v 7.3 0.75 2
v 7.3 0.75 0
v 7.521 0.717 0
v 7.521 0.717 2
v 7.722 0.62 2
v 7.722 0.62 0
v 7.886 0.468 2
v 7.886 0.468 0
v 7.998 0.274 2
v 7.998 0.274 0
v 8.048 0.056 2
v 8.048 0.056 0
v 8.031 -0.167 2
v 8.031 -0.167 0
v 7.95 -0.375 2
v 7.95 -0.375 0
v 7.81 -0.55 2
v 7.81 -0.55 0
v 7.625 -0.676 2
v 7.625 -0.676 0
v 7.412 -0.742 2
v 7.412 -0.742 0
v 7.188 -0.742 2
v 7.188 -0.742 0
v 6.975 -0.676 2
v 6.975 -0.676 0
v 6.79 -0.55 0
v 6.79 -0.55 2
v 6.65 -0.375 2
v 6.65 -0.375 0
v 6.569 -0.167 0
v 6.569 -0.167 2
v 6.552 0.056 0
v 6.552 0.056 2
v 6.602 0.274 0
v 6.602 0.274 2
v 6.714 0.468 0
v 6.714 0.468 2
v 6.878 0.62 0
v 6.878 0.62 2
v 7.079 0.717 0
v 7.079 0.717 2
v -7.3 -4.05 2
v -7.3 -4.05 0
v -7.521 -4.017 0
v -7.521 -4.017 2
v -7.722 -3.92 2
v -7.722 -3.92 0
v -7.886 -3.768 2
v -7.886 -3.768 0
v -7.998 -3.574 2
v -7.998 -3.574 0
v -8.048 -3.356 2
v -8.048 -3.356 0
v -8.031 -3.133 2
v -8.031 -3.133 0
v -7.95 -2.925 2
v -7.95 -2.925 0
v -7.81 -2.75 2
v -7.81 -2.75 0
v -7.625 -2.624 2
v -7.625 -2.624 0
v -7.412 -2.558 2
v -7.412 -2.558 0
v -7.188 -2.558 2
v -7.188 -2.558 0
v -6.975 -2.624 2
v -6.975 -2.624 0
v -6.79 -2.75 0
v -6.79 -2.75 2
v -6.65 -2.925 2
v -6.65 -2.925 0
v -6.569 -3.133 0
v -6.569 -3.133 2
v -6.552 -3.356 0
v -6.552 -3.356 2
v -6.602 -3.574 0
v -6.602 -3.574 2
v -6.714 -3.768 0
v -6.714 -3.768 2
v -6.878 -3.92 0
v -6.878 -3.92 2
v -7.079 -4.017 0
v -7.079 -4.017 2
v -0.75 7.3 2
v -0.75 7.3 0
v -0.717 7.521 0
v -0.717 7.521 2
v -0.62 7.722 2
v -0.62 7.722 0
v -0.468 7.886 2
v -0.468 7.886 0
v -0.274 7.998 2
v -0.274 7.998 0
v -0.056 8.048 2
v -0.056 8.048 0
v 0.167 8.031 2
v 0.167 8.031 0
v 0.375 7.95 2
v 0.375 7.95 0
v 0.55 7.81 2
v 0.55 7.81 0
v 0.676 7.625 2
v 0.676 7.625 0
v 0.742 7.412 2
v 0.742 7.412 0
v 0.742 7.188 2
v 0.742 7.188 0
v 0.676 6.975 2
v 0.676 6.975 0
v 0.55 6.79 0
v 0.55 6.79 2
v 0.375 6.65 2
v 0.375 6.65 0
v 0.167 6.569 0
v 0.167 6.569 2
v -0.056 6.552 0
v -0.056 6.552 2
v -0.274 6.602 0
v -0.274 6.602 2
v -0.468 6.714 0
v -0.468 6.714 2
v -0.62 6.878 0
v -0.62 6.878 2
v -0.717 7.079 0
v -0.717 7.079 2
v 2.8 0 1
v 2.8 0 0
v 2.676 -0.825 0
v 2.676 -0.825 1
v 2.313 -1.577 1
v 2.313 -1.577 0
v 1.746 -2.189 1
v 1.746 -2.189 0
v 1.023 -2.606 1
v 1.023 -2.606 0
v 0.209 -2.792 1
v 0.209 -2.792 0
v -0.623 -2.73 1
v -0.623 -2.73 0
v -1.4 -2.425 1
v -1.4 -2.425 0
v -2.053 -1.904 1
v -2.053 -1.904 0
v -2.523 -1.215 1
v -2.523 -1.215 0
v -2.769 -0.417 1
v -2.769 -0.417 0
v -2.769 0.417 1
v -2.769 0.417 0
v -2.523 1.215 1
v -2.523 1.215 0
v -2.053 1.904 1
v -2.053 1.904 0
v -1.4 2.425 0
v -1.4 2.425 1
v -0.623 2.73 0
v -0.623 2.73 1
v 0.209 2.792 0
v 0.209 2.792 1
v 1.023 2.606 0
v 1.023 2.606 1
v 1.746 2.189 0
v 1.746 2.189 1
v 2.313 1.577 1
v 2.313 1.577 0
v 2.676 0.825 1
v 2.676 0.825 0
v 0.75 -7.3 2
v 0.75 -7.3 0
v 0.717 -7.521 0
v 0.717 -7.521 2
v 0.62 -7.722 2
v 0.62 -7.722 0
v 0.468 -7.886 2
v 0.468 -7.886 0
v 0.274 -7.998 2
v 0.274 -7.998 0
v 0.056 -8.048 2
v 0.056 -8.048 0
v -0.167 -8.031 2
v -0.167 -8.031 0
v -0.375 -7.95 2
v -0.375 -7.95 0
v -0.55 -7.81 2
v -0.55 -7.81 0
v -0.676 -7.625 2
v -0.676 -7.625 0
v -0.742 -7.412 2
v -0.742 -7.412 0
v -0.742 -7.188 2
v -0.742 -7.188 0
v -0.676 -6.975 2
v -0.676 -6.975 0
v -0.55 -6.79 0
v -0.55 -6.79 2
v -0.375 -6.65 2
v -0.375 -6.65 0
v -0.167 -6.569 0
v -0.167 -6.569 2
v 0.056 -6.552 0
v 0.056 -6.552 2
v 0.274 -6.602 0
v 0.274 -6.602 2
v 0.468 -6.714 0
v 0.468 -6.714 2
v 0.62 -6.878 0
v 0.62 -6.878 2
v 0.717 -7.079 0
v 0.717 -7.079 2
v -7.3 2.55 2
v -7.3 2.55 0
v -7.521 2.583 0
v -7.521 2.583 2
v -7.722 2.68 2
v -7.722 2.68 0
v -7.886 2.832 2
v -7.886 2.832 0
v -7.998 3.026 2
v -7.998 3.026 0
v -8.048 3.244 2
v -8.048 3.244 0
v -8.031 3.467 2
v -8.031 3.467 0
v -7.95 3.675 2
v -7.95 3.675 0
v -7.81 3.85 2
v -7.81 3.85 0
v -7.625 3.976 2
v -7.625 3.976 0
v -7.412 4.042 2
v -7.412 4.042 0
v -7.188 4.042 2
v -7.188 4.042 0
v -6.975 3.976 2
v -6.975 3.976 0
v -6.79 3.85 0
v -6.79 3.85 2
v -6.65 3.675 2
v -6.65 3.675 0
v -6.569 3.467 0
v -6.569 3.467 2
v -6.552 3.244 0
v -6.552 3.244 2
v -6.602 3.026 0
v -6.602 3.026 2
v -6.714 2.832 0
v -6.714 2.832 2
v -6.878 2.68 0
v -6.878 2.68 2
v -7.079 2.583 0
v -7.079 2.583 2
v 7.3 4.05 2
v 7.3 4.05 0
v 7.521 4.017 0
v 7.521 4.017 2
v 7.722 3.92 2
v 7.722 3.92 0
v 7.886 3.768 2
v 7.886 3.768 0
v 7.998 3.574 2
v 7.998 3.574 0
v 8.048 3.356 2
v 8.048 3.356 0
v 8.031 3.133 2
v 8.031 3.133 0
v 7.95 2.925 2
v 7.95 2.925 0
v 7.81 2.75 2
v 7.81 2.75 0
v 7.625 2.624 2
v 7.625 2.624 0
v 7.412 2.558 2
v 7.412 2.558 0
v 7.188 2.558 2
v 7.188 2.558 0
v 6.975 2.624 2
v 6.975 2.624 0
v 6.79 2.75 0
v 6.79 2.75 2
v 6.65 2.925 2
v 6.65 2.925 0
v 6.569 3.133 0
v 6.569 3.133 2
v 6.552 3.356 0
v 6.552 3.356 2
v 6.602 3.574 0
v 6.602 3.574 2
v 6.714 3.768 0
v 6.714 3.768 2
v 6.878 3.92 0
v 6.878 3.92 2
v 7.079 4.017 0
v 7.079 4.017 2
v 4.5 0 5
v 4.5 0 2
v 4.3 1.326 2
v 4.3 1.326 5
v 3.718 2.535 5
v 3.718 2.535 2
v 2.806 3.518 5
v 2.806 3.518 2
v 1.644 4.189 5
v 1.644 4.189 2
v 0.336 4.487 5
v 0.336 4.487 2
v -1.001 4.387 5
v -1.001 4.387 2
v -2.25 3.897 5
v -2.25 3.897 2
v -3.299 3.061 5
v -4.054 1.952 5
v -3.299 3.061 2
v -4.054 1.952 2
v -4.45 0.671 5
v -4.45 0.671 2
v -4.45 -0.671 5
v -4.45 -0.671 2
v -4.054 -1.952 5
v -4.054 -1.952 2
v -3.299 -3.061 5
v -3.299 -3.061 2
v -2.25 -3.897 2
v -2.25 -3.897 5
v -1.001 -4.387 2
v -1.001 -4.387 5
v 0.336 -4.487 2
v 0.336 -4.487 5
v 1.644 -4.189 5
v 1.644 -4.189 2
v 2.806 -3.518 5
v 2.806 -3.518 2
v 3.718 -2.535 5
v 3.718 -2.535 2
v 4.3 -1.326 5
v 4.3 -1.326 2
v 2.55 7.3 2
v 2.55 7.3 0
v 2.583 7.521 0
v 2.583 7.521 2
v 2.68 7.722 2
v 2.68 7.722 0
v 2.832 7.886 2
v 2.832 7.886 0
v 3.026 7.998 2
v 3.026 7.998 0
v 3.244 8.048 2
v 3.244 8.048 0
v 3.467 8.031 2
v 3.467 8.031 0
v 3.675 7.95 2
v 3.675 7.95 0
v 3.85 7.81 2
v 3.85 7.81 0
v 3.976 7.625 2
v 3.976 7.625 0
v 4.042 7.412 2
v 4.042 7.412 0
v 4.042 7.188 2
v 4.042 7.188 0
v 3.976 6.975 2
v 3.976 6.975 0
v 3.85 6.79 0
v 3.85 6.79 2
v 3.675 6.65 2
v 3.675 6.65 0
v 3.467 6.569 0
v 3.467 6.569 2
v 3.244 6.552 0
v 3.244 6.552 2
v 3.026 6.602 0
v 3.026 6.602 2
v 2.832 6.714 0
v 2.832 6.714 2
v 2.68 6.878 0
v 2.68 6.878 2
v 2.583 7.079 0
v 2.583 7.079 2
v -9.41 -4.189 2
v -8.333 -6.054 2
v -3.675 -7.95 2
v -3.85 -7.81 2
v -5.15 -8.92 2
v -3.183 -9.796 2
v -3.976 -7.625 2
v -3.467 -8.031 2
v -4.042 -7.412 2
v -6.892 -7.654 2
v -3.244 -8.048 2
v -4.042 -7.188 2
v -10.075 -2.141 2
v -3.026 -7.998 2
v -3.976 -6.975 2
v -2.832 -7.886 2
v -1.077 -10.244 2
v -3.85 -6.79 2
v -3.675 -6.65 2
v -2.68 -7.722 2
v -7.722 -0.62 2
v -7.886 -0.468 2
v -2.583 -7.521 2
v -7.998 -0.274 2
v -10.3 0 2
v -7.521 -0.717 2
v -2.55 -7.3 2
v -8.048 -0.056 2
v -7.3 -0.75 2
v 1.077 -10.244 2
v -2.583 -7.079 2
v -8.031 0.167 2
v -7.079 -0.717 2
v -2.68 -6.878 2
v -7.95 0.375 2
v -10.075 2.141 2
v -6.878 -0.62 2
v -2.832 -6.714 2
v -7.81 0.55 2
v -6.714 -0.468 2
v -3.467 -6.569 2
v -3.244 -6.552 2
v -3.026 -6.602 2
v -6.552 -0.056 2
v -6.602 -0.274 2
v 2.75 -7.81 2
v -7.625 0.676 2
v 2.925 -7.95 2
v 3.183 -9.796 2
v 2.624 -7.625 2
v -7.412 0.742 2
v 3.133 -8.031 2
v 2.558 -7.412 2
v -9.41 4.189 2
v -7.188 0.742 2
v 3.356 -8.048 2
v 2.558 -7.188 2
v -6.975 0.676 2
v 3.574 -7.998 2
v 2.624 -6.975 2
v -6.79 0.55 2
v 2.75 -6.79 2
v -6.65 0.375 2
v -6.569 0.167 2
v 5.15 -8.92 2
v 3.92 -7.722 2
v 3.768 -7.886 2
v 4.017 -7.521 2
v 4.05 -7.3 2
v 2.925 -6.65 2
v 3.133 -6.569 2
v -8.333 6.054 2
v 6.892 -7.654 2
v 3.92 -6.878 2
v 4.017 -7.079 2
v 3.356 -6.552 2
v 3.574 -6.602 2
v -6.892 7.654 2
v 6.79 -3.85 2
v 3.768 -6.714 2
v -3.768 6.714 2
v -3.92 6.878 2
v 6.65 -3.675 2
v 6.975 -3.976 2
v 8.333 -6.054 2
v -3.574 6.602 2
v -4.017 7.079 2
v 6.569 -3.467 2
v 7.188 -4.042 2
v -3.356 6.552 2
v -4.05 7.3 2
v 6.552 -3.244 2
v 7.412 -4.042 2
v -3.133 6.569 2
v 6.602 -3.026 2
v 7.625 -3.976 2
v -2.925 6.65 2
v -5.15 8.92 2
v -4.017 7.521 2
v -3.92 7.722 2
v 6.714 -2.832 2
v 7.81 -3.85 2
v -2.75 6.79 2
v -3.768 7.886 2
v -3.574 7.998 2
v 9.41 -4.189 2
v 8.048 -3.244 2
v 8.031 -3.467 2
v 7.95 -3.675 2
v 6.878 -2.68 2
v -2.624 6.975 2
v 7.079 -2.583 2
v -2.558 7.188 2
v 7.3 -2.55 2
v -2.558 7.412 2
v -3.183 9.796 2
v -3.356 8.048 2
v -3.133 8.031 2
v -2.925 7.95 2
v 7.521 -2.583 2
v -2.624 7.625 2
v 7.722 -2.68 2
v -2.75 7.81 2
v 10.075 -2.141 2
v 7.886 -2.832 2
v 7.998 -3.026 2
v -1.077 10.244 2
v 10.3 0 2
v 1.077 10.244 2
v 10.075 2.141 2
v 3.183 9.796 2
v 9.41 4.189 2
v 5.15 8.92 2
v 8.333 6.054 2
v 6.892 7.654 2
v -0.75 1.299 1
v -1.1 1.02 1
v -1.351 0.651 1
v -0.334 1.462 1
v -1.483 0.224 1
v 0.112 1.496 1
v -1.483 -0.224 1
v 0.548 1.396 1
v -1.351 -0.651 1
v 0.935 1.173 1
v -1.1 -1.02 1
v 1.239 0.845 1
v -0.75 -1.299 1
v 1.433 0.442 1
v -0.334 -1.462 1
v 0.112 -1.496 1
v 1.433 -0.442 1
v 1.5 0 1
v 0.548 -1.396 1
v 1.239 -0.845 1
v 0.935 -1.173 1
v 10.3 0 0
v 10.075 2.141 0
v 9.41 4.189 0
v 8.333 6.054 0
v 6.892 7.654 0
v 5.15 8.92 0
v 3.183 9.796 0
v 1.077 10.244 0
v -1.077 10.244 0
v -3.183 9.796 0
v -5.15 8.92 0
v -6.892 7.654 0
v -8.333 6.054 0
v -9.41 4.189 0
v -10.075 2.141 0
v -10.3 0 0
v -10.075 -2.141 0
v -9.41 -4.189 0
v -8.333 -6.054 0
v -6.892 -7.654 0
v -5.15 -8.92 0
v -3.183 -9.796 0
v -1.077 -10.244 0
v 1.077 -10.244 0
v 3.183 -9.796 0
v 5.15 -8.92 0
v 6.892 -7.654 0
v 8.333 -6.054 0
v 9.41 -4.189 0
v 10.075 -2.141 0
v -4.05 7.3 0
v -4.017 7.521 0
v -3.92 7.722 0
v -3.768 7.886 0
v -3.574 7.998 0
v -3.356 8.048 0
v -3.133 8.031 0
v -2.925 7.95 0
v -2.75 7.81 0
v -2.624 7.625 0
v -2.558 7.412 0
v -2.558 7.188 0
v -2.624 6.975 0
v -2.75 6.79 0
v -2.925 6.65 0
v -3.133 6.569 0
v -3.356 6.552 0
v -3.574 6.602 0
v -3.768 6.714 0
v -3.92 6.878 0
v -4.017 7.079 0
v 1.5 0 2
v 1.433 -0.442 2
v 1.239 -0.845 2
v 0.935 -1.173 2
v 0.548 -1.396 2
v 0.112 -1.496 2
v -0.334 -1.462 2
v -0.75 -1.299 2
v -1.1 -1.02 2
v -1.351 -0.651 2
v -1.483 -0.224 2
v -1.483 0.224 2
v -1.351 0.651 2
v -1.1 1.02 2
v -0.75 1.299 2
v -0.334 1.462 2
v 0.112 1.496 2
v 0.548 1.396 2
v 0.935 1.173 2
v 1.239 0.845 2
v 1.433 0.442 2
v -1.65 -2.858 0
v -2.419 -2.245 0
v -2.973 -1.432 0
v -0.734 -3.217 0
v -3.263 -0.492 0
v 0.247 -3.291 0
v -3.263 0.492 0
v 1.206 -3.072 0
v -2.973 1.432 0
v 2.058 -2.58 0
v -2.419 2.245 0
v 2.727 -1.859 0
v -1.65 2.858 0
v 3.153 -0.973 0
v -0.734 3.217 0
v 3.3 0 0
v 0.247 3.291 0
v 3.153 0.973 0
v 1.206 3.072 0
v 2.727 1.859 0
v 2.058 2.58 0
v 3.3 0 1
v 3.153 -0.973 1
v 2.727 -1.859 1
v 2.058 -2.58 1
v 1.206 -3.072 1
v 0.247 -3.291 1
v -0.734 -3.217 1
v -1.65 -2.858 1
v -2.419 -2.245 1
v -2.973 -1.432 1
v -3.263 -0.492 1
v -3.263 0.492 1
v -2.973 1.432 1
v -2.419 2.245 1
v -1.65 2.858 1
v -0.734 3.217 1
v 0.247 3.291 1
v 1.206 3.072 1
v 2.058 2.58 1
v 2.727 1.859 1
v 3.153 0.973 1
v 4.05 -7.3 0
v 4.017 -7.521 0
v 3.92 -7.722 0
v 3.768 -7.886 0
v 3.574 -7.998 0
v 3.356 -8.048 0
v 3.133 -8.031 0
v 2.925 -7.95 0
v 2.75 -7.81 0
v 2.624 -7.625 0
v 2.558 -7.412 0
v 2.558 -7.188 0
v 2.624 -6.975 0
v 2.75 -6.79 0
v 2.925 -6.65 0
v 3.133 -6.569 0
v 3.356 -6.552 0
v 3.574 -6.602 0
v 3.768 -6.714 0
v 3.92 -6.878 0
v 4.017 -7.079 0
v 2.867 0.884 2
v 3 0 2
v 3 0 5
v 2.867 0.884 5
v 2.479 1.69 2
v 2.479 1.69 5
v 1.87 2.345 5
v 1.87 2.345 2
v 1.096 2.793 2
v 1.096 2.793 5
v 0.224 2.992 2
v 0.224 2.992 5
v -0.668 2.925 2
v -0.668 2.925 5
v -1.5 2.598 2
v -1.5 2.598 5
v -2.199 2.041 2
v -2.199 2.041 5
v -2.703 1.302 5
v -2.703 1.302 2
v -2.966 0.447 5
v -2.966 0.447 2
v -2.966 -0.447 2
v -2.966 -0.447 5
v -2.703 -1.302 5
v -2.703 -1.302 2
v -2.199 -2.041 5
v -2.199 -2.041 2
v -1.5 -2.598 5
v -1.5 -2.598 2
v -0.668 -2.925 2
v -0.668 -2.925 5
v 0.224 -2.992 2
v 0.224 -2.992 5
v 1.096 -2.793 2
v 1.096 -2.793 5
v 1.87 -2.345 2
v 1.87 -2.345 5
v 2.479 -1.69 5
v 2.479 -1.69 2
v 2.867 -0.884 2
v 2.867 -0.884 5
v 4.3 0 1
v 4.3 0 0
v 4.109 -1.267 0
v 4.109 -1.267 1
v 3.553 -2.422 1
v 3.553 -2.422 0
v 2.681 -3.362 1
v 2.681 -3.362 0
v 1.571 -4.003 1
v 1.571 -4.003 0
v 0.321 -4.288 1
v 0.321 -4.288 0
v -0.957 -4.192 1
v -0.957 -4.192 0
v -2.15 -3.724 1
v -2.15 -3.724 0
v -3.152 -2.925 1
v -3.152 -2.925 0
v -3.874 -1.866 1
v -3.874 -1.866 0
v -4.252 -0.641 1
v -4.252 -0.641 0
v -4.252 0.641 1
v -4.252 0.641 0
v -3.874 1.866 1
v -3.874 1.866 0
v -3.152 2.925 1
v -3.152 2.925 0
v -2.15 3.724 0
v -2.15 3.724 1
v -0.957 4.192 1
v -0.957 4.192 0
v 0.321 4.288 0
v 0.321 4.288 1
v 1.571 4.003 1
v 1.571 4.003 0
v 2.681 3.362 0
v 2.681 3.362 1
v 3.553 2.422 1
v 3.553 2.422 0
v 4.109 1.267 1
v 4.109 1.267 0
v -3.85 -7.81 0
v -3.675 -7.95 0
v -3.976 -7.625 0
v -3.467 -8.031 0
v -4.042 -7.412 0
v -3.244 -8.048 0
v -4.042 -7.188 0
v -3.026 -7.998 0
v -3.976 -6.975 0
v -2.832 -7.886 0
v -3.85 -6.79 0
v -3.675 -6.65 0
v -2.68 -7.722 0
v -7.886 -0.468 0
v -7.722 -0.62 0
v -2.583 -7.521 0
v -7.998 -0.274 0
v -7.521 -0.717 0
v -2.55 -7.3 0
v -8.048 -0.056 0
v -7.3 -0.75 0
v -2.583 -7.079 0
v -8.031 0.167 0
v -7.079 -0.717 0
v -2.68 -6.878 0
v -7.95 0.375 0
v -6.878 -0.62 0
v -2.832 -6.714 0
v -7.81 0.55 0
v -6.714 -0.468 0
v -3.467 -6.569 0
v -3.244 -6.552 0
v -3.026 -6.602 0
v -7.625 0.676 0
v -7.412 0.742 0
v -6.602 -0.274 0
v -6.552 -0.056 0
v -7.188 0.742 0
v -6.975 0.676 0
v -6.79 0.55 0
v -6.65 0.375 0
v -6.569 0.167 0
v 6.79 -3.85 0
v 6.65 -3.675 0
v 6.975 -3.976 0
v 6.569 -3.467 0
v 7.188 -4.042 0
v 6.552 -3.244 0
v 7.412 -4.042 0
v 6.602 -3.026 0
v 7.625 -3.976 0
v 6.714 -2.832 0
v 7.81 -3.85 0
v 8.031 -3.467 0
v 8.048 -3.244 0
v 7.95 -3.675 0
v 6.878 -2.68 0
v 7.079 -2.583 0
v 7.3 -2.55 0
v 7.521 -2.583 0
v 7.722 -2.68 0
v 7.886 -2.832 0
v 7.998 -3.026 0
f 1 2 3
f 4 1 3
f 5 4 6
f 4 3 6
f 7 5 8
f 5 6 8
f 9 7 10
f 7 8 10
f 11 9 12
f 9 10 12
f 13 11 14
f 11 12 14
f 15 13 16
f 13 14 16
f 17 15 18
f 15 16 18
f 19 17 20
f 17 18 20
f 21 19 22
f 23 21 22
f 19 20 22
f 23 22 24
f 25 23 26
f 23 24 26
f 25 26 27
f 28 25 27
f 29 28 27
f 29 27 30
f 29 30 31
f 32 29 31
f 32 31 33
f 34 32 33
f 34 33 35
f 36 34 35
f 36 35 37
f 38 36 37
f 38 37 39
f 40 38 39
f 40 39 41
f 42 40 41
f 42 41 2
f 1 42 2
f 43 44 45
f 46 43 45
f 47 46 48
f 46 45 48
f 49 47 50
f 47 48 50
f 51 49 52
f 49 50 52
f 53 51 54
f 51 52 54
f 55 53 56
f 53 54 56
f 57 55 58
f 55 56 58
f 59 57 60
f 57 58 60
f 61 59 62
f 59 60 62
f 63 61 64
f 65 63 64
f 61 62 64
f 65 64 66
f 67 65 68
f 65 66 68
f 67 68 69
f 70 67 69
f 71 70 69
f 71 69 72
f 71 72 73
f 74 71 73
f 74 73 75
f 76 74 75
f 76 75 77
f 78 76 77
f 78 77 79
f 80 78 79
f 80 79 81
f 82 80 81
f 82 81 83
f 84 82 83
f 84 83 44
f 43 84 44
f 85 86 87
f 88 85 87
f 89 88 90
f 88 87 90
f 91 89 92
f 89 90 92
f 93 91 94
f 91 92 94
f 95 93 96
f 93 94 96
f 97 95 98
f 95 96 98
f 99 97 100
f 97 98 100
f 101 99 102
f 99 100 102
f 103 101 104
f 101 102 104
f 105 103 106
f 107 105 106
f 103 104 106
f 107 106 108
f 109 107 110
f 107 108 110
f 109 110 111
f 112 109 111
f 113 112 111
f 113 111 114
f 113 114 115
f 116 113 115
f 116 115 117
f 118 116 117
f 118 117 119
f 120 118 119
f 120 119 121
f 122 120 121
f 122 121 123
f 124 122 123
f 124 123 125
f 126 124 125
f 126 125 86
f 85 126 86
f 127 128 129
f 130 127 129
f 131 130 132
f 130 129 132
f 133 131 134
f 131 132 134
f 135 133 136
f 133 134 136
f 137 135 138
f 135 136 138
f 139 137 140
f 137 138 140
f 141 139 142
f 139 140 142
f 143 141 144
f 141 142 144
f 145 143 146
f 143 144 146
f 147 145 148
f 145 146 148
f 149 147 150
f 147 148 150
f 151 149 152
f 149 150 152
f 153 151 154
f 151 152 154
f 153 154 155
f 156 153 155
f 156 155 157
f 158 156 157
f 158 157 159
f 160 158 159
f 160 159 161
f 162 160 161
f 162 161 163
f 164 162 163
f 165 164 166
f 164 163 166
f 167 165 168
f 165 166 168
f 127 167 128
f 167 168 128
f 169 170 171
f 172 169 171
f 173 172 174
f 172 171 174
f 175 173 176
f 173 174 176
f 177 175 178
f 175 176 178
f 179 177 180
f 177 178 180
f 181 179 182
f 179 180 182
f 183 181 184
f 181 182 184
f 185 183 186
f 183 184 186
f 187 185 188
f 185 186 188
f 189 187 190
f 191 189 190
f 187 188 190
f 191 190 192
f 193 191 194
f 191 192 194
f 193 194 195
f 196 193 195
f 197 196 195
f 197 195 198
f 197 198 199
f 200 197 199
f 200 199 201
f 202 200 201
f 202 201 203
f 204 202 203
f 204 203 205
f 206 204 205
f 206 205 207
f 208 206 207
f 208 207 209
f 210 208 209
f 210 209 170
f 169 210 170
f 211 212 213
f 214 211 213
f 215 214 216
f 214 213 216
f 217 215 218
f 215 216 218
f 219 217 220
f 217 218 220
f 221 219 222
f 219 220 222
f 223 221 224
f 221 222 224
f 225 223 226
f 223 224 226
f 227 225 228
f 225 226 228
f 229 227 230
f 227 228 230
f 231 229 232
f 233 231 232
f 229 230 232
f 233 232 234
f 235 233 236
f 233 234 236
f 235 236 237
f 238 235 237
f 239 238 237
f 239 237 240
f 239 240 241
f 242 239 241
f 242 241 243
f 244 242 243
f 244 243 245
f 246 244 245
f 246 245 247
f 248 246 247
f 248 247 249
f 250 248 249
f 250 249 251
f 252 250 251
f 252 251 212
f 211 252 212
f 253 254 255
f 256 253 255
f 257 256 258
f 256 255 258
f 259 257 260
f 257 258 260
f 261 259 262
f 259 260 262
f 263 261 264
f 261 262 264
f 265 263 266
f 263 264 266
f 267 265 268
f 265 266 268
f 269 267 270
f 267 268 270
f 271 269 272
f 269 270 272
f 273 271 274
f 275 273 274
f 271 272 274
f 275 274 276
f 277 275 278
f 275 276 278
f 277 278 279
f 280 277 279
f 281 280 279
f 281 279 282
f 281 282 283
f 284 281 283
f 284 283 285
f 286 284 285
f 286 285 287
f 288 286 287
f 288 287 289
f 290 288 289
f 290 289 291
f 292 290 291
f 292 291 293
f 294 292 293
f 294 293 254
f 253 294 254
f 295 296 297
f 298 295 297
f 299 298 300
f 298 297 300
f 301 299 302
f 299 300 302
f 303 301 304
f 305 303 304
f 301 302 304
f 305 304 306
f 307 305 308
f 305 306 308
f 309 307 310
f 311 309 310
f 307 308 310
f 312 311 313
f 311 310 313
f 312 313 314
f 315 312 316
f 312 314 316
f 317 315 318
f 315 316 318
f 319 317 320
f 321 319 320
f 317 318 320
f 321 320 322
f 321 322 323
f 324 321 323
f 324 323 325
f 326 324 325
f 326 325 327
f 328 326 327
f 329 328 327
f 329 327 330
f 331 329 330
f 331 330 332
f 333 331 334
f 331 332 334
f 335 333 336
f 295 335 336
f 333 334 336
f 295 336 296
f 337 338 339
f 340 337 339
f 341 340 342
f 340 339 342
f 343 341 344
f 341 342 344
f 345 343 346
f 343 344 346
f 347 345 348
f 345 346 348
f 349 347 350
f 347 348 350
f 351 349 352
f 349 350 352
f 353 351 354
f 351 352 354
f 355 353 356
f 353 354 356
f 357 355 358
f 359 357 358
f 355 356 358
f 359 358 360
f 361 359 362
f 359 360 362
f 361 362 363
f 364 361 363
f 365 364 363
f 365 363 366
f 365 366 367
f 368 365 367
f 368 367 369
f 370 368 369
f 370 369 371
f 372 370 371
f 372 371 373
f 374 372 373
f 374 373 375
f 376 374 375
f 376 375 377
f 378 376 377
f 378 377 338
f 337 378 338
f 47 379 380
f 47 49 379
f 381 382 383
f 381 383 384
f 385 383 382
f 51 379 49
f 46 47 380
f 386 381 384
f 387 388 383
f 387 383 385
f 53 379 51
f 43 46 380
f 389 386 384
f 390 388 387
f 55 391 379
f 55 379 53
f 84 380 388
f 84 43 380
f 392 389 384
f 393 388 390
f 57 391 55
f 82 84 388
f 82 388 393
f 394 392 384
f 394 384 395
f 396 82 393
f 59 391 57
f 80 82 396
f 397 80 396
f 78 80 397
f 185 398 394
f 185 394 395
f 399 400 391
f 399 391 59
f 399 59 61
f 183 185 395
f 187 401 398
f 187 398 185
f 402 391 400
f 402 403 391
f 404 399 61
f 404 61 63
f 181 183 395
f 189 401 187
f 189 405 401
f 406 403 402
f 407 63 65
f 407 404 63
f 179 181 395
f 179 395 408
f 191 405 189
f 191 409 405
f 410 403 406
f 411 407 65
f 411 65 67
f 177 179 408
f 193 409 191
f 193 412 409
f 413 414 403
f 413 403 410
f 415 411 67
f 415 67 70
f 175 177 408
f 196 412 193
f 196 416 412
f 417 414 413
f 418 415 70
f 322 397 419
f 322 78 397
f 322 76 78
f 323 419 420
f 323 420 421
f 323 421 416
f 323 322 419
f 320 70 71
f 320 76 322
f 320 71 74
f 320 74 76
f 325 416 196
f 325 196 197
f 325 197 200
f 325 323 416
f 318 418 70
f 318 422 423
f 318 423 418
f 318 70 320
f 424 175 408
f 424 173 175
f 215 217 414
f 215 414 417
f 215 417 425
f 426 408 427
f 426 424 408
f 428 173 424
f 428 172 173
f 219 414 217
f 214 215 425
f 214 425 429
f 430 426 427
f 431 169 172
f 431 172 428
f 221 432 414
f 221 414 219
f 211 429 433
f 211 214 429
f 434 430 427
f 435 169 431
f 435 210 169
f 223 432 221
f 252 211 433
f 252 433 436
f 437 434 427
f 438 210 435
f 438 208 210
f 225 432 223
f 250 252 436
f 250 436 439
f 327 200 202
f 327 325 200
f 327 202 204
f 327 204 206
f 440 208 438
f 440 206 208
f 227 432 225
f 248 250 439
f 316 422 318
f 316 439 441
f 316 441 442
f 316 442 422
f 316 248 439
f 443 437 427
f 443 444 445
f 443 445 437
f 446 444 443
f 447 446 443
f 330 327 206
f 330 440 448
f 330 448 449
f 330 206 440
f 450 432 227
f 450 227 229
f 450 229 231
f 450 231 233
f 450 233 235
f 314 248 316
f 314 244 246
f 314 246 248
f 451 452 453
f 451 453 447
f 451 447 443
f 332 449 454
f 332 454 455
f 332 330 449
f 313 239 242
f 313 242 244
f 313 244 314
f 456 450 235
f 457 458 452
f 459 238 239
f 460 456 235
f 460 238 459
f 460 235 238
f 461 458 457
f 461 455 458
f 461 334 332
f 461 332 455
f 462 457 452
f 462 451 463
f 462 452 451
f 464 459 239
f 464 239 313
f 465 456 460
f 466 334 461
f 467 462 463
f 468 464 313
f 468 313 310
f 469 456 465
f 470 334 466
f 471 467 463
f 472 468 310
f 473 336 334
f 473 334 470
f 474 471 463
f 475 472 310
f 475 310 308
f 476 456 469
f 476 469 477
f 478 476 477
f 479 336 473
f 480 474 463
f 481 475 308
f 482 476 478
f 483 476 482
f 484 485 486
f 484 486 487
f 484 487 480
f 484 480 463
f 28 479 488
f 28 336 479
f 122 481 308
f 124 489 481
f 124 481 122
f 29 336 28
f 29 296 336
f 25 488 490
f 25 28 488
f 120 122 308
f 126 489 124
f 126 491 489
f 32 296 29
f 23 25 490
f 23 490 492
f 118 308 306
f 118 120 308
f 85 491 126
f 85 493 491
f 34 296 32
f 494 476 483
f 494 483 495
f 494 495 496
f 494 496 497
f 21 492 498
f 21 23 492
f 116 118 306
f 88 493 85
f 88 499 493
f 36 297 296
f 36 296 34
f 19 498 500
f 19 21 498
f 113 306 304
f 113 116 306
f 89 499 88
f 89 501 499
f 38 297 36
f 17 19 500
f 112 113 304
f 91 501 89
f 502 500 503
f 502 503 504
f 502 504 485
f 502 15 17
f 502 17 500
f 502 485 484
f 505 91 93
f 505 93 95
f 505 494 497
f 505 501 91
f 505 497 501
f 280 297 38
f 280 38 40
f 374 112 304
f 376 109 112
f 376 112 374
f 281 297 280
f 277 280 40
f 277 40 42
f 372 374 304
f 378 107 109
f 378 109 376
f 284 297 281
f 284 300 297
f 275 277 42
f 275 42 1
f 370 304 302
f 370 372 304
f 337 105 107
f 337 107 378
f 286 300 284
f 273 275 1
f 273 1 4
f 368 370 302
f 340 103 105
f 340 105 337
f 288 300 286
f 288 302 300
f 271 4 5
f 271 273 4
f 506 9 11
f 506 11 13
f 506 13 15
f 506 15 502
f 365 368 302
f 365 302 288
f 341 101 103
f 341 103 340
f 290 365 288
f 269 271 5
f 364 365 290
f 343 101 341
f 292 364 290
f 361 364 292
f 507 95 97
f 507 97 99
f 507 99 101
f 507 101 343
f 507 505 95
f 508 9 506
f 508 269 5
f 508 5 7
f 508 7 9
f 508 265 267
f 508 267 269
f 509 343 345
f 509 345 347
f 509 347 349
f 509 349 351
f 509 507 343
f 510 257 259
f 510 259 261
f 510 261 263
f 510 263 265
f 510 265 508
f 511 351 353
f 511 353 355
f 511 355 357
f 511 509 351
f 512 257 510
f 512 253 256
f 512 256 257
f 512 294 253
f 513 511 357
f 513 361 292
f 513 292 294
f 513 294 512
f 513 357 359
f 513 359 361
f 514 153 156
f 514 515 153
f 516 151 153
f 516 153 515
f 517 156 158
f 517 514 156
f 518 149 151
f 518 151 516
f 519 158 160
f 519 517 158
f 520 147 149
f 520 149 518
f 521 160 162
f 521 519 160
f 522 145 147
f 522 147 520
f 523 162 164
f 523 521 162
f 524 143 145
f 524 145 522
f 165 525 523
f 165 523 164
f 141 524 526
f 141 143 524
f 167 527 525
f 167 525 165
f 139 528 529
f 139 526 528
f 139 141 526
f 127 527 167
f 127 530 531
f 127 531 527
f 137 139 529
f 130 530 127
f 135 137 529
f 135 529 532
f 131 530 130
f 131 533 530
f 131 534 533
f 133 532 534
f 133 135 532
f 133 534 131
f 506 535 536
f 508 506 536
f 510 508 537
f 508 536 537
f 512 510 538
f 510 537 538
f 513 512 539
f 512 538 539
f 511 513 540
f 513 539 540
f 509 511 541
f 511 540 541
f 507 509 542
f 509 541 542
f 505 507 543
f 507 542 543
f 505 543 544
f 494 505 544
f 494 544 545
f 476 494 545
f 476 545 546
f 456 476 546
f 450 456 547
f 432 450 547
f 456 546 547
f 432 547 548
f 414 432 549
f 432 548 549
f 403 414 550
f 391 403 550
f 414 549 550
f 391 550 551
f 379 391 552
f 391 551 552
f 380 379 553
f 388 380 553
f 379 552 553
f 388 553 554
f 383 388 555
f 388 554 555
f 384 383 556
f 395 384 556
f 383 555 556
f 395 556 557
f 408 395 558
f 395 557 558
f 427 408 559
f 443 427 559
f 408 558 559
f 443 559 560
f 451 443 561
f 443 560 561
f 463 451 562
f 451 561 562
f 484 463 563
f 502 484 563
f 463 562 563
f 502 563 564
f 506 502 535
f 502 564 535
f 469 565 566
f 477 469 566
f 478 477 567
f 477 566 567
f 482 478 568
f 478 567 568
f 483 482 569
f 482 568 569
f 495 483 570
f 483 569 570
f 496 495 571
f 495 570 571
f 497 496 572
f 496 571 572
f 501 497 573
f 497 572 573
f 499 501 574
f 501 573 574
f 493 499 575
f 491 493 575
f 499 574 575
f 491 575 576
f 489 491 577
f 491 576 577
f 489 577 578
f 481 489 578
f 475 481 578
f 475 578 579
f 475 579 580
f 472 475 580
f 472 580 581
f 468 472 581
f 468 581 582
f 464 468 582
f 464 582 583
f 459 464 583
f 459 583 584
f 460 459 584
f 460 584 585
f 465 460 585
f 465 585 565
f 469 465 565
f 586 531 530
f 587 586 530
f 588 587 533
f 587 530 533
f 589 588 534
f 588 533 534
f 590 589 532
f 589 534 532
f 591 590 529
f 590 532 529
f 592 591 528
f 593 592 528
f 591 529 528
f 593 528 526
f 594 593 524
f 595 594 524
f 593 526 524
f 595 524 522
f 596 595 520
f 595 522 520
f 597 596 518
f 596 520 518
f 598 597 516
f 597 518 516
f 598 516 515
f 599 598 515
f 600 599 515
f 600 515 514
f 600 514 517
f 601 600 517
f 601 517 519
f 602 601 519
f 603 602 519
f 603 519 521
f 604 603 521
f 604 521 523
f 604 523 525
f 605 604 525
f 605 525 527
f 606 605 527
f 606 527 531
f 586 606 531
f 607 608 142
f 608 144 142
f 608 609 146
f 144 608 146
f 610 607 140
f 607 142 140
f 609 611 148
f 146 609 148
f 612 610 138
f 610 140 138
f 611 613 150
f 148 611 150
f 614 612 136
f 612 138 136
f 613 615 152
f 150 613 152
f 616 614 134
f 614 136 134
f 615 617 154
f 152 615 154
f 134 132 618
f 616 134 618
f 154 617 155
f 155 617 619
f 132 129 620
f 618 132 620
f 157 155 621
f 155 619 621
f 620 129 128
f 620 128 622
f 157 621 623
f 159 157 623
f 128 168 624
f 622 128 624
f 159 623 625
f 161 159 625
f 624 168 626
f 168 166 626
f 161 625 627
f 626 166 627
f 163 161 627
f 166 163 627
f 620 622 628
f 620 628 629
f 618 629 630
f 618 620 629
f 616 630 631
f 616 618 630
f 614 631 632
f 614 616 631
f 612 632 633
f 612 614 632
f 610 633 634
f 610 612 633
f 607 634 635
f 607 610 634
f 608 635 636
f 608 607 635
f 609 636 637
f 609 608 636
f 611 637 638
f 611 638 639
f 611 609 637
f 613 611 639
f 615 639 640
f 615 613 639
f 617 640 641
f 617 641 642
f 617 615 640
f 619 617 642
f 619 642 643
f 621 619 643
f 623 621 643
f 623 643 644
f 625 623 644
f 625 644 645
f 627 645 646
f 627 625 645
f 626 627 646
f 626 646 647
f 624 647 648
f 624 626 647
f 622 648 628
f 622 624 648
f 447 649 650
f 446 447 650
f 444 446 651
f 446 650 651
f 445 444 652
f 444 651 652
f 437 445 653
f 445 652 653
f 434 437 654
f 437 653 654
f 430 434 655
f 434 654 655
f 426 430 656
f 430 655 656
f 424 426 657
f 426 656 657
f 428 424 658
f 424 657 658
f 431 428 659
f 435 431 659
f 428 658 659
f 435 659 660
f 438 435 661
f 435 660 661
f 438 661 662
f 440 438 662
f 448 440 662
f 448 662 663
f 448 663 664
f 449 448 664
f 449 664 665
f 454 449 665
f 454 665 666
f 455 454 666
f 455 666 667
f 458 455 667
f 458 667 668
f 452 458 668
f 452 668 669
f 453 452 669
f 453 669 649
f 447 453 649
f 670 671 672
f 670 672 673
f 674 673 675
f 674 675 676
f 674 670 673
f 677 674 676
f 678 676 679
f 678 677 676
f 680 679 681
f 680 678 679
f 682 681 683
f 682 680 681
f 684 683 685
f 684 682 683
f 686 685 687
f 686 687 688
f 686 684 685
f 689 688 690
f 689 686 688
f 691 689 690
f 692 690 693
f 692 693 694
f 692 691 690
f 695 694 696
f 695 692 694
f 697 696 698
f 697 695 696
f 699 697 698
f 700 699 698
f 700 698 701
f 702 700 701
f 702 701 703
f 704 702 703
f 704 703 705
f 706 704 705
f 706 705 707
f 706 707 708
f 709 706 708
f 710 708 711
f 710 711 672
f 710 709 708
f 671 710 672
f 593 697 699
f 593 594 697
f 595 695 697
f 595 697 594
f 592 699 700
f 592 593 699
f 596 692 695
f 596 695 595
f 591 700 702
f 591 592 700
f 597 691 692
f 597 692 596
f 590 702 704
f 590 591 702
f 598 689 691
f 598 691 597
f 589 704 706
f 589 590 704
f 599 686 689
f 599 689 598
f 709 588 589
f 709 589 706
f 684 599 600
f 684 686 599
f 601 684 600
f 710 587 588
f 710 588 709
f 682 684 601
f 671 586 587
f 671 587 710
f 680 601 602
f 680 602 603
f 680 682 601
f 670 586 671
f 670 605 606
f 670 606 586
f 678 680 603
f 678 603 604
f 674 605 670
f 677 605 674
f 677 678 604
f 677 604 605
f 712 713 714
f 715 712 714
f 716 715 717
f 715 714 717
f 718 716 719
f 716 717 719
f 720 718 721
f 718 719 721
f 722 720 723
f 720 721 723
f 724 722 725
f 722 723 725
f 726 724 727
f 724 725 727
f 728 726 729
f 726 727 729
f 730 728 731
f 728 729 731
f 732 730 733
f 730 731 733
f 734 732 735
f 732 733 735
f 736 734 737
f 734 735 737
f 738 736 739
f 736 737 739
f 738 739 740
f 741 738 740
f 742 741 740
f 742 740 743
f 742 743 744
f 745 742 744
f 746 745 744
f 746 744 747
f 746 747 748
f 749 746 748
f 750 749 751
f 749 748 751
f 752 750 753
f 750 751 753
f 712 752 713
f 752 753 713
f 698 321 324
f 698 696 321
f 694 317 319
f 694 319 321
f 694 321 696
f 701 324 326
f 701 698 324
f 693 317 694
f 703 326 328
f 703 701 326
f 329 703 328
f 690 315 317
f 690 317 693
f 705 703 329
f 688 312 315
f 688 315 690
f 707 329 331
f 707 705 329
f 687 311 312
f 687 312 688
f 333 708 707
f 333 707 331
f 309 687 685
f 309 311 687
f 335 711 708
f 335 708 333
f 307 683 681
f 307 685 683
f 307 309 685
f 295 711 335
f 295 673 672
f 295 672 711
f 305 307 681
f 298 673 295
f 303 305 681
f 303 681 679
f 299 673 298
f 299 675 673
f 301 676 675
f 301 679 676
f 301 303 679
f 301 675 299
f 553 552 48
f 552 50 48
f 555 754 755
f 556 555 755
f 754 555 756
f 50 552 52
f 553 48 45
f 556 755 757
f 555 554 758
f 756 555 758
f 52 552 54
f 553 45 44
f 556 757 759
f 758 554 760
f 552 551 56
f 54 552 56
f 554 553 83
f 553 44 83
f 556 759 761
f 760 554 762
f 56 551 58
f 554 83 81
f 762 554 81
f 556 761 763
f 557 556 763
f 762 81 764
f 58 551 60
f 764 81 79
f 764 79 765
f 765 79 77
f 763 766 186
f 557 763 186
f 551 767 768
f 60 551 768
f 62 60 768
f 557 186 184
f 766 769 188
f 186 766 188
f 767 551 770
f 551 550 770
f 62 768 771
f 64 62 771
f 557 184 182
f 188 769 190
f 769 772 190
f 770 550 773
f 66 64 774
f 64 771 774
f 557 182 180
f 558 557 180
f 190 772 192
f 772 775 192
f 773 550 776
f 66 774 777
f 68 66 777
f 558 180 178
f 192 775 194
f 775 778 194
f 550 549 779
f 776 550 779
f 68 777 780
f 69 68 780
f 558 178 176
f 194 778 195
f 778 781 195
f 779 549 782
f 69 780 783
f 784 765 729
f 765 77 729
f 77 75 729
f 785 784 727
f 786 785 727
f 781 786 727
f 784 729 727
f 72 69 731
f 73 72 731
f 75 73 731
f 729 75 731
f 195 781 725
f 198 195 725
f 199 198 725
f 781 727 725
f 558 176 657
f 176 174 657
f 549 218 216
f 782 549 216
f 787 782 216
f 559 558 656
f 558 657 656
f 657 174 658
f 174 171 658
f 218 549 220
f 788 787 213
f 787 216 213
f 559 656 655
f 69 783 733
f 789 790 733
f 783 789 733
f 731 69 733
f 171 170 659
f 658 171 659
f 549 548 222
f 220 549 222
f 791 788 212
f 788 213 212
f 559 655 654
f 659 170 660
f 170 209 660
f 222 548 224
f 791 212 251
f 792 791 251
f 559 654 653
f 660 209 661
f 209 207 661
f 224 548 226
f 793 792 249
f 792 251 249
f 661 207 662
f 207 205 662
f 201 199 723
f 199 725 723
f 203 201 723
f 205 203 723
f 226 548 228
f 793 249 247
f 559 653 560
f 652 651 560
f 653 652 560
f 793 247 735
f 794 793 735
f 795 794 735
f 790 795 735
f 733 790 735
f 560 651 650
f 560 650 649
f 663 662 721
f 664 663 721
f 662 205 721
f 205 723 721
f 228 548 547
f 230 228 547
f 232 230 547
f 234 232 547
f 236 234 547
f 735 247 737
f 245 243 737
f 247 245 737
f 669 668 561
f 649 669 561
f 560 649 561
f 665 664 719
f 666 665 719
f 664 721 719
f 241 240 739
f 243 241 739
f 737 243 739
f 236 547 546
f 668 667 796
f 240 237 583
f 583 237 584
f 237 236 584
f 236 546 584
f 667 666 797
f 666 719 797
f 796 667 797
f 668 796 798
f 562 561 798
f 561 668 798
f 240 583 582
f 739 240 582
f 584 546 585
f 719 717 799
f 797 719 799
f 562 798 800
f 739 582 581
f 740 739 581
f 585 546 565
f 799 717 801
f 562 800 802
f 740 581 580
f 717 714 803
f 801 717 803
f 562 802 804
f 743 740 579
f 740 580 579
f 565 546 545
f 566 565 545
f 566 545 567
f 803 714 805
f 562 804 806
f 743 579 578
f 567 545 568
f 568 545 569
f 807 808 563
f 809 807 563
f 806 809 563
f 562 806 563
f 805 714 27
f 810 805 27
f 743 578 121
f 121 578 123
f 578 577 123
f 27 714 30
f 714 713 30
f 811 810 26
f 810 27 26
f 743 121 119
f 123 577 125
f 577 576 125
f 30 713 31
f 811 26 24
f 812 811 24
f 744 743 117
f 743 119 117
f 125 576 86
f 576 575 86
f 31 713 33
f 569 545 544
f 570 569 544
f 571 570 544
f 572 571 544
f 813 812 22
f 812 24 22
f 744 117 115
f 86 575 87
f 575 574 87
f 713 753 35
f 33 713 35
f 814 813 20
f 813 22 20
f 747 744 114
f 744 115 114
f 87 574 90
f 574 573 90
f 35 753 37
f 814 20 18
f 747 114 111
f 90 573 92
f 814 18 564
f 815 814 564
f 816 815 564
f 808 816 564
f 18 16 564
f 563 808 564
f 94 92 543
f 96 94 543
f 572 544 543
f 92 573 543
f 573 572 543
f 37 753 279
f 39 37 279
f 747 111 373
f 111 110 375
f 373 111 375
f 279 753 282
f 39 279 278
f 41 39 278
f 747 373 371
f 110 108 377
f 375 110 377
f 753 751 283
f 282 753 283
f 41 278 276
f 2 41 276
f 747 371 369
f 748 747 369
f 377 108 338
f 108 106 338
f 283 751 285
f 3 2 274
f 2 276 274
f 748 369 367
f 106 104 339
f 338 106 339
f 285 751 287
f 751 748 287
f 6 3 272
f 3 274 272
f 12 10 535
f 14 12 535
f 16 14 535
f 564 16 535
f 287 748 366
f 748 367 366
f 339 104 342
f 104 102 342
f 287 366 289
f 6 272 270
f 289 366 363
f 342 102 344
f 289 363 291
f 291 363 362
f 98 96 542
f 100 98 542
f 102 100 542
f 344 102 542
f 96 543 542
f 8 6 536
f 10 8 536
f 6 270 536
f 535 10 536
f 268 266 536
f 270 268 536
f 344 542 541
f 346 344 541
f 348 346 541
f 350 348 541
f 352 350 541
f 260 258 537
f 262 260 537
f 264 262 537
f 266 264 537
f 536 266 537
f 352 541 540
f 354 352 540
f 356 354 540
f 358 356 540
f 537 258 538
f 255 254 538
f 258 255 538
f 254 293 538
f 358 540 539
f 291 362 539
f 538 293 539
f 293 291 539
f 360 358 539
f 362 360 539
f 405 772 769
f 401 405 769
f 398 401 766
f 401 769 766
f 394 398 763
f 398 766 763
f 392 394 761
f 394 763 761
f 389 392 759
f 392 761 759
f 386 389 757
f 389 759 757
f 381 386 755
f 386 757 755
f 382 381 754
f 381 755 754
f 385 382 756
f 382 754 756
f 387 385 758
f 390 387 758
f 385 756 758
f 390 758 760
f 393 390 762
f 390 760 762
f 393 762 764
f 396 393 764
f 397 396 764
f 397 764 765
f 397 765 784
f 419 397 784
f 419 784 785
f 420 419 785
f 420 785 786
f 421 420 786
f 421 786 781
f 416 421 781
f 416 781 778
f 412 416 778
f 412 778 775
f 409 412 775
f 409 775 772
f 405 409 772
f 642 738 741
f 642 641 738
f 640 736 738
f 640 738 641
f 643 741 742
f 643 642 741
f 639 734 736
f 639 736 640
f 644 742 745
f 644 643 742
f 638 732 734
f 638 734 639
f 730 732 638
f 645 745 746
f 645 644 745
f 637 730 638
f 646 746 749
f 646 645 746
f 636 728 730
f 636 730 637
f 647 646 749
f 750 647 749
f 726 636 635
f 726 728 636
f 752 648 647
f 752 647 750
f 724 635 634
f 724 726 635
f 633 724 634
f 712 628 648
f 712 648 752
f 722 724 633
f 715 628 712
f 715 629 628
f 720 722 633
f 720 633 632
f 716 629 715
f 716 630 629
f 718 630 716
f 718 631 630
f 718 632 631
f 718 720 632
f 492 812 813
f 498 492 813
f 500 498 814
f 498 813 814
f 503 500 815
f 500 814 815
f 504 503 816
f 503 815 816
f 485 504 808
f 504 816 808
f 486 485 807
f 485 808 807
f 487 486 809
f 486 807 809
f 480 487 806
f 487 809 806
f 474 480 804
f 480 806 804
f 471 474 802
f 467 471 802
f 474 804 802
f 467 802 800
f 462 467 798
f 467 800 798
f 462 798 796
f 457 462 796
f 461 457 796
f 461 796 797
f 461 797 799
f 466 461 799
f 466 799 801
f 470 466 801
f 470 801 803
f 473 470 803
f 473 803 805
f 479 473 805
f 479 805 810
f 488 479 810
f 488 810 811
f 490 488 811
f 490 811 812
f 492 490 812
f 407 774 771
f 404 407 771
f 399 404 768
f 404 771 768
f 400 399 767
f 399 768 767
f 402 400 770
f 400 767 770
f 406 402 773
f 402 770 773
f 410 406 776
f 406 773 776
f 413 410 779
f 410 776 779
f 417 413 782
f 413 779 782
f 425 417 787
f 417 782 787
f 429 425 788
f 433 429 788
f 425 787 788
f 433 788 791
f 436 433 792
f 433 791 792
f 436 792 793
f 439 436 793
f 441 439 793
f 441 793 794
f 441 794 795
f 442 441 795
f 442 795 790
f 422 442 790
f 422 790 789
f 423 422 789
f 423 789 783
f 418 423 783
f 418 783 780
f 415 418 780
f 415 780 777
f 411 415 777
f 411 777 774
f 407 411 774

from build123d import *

# Parameters (mm, degrees)
SKETCH_R           = 10.3
PAD_DEPTH          = 2
SKETCH001_R        = 4.3
SKETCH001_R_2      = 3.3
POCKET_DEPTH       = 1
SKETCH002_R        = 2.8
POCKET001_DEPTH    = 1
SKETCH003_R        = 1.5
POCKET002_DEPTH    = 1.001
SKETCH004_R        = 4.5
SKETCH004_R_2      = 3
PAD001_DEPTH       = 3
SKETCH005_R        = 0.75
POCKET003_DEPTH    = 5
POLARPATTERN_COUNT = 4


with BuildPart() as part:
    # Sketch → Pad (new body)
    with BuildSketch(Plane.XY):
        Circle(SKETCH_R)
    extrude(amount=PAD_DEPTH)

    # Sketch001 (on Face2 of Pad) → Pocket (cut)
    with BuildSketch(Plane(origin=(0, 0, 0), x_dir=(1, 0, 0), z_dir=(0, 0, -1))):
        Circle(SKETCH001_R)
        Circle(SKETCH001_R_2, mode=Mode.SUBTRACT)
    extrude(amount=-POCKET_DEPTH, mode=Mode.SUBTRACT)

    # Sketch002 (on Face7 of Pocket) → Pocket001 (cut)
    with BuildSketch(Plane(origin=(0, 0, 0), x_dir=(1, 0, 0), z_dir=(0, 0, -1))):
        Circle(SKETCH002_R)
    extrude(amount=-POCKET001_DEPTH, mode=Mode.SUBTRACT)

    # Sketch003 (on Face9 of Pocket001) → Pocket002 (cut, through all)
    with BuildSketch(Plane(origin=(0, 0, 1), x_dir=(1, 0, 0), z_dir=(0, 0, -1))):
        Circle(SKETCH003_R)
    extrude(amount=-POCKET002_DEPTH, mode=Mode.SUBTRACT)

    # Sketch004 (on Face3 of Pocket002) → Pad001 (join)
    with BuildSketch(Plane.XY.offset(2)):
        Circle(SKETCH004_R)
        Circle(SKETCH004_R_2, mode=Mode.SUBTRACT)
    extrude(amount=PAD001_DEPTH)

    # Sketch005 (on Face2 of Pad001) → Pocket003 (cut)
    with BuildSketch(Plane(origin=(0, 0, 0), x_dir=(1, 0, 0), z_dir=(0, 0, -1))):
        with Locations((-3.3, 7.3)):
            Circle(SKETCH005_R)
        with Locations((0, 7.3)):
            Circle(SKETCH005_R)
        with Locations((3.3, 7.3)):
            Circle(SKETCH005_R)
    pocket003 = extrude(amount=-POCKET003_DEPTH, mode=Mode.SUBTRACT)

    # PolarPattern: Pocket003 ×4 about axis
    polarpattern_axis = Axis((0, 0, 0), (0, 0, -1))
    for i in range(1, POLARPATTERN_COUNT):
        add(pocket003.rotate(polarpattern_axis, i * 360 / POLARPATTERN_COUNT), mode=Mode.SUBTRACT)


solid = part.part
